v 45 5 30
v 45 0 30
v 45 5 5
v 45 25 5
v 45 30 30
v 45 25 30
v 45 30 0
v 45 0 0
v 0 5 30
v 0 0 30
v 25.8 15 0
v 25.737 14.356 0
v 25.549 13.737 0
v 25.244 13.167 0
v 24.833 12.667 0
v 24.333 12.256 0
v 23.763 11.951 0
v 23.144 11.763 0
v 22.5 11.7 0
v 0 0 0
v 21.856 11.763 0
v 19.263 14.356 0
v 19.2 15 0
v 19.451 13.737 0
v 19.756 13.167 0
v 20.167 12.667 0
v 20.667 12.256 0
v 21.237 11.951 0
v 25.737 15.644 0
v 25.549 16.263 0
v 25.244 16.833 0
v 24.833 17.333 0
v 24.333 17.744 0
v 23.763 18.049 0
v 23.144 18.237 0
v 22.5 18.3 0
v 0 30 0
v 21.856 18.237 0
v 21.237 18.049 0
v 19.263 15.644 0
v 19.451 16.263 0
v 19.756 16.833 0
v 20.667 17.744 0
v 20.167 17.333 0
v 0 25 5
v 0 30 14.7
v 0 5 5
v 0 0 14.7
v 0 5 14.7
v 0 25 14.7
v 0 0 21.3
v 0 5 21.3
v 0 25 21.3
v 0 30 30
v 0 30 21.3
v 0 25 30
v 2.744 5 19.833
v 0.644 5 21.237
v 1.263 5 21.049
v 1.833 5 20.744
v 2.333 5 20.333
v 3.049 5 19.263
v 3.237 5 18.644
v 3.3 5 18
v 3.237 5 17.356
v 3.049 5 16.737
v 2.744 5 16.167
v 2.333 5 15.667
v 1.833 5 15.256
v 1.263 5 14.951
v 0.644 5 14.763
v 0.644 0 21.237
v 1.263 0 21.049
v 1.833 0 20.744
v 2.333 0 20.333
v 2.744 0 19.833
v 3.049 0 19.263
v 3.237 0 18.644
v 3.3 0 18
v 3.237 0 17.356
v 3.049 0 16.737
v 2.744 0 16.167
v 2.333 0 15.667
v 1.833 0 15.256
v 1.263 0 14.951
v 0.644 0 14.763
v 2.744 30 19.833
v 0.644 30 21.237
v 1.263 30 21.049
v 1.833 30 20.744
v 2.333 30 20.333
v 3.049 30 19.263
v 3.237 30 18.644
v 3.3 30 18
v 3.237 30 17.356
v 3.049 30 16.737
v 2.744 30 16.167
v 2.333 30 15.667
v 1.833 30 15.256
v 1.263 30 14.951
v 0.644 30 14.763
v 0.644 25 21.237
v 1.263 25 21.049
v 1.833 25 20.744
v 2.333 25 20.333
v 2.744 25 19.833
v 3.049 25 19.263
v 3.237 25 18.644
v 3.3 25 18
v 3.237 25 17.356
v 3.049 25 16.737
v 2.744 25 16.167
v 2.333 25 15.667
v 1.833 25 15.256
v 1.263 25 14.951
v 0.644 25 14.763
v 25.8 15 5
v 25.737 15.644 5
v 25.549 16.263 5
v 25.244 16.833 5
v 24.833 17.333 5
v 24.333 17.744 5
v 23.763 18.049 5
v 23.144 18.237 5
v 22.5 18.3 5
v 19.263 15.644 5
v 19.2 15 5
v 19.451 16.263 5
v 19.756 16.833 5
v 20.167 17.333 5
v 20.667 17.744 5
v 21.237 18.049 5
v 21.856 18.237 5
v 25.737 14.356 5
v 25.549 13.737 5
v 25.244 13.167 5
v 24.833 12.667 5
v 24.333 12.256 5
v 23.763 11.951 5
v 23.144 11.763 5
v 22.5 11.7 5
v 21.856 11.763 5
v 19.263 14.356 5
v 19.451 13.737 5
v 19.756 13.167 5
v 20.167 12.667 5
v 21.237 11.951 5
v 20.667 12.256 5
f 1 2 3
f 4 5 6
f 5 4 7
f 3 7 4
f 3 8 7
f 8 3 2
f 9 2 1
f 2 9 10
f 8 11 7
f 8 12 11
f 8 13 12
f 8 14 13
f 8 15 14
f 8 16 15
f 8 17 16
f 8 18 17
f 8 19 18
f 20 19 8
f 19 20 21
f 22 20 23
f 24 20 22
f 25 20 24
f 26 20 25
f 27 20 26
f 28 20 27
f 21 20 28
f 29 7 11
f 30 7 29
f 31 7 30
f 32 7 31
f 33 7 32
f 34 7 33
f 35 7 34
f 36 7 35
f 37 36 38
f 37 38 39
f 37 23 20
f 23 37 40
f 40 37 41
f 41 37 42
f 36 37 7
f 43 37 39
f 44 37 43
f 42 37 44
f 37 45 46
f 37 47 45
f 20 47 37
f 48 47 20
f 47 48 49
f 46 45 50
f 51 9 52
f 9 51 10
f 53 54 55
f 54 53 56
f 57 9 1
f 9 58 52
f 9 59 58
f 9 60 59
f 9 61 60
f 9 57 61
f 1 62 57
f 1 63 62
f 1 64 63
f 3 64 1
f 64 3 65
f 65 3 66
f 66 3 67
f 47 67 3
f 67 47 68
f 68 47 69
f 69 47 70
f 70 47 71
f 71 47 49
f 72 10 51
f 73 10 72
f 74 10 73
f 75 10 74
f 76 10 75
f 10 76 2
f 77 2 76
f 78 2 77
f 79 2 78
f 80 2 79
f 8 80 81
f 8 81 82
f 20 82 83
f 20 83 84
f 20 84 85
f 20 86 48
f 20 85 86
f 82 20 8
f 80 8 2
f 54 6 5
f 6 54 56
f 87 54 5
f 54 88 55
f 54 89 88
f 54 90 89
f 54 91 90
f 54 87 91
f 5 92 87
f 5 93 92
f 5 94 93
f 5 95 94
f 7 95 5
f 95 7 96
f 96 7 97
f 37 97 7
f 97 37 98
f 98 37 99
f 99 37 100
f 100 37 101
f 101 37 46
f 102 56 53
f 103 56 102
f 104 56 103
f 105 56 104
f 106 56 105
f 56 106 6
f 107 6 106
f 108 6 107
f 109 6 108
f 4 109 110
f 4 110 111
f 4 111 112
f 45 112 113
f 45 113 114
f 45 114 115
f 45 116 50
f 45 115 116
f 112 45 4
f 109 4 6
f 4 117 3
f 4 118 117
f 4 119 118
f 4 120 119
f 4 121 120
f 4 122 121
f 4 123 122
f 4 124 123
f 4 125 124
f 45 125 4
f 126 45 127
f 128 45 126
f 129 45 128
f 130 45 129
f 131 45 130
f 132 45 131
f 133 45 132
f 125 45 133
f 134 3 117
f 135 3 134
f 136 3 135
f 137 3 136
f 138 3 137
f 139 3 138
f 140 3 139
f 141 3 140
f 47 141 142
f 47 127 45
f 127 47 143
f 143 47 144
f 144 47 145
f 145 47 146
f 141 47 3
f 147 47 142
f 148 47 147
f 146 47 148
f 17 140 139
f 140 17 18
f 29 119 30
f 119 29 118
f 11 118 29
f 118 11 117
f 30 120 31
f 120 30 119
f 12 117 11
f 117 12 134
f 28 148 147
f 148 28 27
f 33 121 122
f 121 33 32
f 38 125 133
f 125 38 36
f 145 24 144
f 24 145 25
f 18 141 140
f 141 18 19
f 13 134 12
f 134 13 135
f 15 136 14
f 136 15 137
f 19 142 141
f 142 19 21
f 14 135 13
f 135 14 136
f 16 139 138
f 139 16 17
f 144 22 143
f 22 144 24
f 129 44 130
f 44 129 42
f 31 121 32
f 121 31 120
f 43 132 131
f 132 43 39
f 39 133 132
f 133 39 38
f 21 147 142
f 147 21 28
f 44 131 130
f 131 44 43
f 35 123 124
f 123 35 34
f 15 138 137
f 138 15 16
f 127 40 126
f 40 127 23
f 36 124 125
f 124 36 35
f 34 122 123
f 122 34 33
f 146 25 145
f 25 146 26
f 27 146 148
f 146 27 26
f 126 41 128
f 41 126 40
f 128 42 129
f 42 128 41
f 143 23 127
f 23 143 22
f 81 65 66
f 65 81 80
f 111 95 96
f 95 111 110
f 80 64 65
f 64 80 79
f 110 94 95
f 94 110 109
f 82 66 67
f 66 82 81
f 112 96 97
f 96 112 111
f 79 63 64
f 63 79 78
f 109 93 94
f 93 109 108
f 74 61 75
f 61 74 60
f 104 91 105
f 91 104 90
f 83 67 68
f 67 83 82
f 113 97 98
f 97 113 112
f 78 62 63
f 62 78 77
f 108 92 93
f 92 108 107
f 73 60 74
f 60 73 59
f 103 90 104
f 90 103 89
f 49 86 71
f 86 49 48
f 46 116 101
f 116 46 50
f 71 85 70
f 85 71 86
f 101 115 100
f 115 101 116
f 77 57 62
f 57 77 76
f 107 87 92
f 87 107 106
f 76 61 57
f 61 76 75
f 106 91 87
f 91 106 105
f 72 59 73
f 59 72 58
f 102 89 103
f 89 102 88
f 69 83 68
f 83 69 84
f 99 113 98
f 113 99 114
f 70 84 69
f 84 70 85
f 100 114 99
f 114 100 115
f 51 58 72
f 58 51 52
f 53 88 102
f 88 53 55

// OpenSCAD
$fn = 32;

// ----------------------------------------------------------------------
// U-bracket: 45 x 30 x 30 mm
// ----------------------------------------------------------------------

// --- parameters (mm) ---
rail_len = 45;            // outer length, X
jaw_w = 30;               // outer width, Y
jaw_h = 30;               // upright height, Z
web_t = 5;                // wall thickness
hole_d = 6.6;             // clearance for M6

module hole_z(px, py) {
  translate([px, py, -2.5]) cylinder(h = web_t + 5, d = hole_d);
}
module hole_y_pz(pz) {
  /* through both uprights along Y */
  translate([0, -2.5, pz]) rotate([-90, 0, 0]) cylinder(h = jaw_w + 5, d = hole_d);
}

module base() {
  cube([rail_len, jaw_w, web_t]);
}

module uprights() {
  cube([rail_len, web_t, jaw_h]);
  translate([0, jaw_w - web_t, 0]) cube([rail_len, web_t, jaw_h]);
}

difference() {
  union() {
    base();
    uprights();
  }
  hole_z(22.5, 15);
  hole_y_pz(18);
}
